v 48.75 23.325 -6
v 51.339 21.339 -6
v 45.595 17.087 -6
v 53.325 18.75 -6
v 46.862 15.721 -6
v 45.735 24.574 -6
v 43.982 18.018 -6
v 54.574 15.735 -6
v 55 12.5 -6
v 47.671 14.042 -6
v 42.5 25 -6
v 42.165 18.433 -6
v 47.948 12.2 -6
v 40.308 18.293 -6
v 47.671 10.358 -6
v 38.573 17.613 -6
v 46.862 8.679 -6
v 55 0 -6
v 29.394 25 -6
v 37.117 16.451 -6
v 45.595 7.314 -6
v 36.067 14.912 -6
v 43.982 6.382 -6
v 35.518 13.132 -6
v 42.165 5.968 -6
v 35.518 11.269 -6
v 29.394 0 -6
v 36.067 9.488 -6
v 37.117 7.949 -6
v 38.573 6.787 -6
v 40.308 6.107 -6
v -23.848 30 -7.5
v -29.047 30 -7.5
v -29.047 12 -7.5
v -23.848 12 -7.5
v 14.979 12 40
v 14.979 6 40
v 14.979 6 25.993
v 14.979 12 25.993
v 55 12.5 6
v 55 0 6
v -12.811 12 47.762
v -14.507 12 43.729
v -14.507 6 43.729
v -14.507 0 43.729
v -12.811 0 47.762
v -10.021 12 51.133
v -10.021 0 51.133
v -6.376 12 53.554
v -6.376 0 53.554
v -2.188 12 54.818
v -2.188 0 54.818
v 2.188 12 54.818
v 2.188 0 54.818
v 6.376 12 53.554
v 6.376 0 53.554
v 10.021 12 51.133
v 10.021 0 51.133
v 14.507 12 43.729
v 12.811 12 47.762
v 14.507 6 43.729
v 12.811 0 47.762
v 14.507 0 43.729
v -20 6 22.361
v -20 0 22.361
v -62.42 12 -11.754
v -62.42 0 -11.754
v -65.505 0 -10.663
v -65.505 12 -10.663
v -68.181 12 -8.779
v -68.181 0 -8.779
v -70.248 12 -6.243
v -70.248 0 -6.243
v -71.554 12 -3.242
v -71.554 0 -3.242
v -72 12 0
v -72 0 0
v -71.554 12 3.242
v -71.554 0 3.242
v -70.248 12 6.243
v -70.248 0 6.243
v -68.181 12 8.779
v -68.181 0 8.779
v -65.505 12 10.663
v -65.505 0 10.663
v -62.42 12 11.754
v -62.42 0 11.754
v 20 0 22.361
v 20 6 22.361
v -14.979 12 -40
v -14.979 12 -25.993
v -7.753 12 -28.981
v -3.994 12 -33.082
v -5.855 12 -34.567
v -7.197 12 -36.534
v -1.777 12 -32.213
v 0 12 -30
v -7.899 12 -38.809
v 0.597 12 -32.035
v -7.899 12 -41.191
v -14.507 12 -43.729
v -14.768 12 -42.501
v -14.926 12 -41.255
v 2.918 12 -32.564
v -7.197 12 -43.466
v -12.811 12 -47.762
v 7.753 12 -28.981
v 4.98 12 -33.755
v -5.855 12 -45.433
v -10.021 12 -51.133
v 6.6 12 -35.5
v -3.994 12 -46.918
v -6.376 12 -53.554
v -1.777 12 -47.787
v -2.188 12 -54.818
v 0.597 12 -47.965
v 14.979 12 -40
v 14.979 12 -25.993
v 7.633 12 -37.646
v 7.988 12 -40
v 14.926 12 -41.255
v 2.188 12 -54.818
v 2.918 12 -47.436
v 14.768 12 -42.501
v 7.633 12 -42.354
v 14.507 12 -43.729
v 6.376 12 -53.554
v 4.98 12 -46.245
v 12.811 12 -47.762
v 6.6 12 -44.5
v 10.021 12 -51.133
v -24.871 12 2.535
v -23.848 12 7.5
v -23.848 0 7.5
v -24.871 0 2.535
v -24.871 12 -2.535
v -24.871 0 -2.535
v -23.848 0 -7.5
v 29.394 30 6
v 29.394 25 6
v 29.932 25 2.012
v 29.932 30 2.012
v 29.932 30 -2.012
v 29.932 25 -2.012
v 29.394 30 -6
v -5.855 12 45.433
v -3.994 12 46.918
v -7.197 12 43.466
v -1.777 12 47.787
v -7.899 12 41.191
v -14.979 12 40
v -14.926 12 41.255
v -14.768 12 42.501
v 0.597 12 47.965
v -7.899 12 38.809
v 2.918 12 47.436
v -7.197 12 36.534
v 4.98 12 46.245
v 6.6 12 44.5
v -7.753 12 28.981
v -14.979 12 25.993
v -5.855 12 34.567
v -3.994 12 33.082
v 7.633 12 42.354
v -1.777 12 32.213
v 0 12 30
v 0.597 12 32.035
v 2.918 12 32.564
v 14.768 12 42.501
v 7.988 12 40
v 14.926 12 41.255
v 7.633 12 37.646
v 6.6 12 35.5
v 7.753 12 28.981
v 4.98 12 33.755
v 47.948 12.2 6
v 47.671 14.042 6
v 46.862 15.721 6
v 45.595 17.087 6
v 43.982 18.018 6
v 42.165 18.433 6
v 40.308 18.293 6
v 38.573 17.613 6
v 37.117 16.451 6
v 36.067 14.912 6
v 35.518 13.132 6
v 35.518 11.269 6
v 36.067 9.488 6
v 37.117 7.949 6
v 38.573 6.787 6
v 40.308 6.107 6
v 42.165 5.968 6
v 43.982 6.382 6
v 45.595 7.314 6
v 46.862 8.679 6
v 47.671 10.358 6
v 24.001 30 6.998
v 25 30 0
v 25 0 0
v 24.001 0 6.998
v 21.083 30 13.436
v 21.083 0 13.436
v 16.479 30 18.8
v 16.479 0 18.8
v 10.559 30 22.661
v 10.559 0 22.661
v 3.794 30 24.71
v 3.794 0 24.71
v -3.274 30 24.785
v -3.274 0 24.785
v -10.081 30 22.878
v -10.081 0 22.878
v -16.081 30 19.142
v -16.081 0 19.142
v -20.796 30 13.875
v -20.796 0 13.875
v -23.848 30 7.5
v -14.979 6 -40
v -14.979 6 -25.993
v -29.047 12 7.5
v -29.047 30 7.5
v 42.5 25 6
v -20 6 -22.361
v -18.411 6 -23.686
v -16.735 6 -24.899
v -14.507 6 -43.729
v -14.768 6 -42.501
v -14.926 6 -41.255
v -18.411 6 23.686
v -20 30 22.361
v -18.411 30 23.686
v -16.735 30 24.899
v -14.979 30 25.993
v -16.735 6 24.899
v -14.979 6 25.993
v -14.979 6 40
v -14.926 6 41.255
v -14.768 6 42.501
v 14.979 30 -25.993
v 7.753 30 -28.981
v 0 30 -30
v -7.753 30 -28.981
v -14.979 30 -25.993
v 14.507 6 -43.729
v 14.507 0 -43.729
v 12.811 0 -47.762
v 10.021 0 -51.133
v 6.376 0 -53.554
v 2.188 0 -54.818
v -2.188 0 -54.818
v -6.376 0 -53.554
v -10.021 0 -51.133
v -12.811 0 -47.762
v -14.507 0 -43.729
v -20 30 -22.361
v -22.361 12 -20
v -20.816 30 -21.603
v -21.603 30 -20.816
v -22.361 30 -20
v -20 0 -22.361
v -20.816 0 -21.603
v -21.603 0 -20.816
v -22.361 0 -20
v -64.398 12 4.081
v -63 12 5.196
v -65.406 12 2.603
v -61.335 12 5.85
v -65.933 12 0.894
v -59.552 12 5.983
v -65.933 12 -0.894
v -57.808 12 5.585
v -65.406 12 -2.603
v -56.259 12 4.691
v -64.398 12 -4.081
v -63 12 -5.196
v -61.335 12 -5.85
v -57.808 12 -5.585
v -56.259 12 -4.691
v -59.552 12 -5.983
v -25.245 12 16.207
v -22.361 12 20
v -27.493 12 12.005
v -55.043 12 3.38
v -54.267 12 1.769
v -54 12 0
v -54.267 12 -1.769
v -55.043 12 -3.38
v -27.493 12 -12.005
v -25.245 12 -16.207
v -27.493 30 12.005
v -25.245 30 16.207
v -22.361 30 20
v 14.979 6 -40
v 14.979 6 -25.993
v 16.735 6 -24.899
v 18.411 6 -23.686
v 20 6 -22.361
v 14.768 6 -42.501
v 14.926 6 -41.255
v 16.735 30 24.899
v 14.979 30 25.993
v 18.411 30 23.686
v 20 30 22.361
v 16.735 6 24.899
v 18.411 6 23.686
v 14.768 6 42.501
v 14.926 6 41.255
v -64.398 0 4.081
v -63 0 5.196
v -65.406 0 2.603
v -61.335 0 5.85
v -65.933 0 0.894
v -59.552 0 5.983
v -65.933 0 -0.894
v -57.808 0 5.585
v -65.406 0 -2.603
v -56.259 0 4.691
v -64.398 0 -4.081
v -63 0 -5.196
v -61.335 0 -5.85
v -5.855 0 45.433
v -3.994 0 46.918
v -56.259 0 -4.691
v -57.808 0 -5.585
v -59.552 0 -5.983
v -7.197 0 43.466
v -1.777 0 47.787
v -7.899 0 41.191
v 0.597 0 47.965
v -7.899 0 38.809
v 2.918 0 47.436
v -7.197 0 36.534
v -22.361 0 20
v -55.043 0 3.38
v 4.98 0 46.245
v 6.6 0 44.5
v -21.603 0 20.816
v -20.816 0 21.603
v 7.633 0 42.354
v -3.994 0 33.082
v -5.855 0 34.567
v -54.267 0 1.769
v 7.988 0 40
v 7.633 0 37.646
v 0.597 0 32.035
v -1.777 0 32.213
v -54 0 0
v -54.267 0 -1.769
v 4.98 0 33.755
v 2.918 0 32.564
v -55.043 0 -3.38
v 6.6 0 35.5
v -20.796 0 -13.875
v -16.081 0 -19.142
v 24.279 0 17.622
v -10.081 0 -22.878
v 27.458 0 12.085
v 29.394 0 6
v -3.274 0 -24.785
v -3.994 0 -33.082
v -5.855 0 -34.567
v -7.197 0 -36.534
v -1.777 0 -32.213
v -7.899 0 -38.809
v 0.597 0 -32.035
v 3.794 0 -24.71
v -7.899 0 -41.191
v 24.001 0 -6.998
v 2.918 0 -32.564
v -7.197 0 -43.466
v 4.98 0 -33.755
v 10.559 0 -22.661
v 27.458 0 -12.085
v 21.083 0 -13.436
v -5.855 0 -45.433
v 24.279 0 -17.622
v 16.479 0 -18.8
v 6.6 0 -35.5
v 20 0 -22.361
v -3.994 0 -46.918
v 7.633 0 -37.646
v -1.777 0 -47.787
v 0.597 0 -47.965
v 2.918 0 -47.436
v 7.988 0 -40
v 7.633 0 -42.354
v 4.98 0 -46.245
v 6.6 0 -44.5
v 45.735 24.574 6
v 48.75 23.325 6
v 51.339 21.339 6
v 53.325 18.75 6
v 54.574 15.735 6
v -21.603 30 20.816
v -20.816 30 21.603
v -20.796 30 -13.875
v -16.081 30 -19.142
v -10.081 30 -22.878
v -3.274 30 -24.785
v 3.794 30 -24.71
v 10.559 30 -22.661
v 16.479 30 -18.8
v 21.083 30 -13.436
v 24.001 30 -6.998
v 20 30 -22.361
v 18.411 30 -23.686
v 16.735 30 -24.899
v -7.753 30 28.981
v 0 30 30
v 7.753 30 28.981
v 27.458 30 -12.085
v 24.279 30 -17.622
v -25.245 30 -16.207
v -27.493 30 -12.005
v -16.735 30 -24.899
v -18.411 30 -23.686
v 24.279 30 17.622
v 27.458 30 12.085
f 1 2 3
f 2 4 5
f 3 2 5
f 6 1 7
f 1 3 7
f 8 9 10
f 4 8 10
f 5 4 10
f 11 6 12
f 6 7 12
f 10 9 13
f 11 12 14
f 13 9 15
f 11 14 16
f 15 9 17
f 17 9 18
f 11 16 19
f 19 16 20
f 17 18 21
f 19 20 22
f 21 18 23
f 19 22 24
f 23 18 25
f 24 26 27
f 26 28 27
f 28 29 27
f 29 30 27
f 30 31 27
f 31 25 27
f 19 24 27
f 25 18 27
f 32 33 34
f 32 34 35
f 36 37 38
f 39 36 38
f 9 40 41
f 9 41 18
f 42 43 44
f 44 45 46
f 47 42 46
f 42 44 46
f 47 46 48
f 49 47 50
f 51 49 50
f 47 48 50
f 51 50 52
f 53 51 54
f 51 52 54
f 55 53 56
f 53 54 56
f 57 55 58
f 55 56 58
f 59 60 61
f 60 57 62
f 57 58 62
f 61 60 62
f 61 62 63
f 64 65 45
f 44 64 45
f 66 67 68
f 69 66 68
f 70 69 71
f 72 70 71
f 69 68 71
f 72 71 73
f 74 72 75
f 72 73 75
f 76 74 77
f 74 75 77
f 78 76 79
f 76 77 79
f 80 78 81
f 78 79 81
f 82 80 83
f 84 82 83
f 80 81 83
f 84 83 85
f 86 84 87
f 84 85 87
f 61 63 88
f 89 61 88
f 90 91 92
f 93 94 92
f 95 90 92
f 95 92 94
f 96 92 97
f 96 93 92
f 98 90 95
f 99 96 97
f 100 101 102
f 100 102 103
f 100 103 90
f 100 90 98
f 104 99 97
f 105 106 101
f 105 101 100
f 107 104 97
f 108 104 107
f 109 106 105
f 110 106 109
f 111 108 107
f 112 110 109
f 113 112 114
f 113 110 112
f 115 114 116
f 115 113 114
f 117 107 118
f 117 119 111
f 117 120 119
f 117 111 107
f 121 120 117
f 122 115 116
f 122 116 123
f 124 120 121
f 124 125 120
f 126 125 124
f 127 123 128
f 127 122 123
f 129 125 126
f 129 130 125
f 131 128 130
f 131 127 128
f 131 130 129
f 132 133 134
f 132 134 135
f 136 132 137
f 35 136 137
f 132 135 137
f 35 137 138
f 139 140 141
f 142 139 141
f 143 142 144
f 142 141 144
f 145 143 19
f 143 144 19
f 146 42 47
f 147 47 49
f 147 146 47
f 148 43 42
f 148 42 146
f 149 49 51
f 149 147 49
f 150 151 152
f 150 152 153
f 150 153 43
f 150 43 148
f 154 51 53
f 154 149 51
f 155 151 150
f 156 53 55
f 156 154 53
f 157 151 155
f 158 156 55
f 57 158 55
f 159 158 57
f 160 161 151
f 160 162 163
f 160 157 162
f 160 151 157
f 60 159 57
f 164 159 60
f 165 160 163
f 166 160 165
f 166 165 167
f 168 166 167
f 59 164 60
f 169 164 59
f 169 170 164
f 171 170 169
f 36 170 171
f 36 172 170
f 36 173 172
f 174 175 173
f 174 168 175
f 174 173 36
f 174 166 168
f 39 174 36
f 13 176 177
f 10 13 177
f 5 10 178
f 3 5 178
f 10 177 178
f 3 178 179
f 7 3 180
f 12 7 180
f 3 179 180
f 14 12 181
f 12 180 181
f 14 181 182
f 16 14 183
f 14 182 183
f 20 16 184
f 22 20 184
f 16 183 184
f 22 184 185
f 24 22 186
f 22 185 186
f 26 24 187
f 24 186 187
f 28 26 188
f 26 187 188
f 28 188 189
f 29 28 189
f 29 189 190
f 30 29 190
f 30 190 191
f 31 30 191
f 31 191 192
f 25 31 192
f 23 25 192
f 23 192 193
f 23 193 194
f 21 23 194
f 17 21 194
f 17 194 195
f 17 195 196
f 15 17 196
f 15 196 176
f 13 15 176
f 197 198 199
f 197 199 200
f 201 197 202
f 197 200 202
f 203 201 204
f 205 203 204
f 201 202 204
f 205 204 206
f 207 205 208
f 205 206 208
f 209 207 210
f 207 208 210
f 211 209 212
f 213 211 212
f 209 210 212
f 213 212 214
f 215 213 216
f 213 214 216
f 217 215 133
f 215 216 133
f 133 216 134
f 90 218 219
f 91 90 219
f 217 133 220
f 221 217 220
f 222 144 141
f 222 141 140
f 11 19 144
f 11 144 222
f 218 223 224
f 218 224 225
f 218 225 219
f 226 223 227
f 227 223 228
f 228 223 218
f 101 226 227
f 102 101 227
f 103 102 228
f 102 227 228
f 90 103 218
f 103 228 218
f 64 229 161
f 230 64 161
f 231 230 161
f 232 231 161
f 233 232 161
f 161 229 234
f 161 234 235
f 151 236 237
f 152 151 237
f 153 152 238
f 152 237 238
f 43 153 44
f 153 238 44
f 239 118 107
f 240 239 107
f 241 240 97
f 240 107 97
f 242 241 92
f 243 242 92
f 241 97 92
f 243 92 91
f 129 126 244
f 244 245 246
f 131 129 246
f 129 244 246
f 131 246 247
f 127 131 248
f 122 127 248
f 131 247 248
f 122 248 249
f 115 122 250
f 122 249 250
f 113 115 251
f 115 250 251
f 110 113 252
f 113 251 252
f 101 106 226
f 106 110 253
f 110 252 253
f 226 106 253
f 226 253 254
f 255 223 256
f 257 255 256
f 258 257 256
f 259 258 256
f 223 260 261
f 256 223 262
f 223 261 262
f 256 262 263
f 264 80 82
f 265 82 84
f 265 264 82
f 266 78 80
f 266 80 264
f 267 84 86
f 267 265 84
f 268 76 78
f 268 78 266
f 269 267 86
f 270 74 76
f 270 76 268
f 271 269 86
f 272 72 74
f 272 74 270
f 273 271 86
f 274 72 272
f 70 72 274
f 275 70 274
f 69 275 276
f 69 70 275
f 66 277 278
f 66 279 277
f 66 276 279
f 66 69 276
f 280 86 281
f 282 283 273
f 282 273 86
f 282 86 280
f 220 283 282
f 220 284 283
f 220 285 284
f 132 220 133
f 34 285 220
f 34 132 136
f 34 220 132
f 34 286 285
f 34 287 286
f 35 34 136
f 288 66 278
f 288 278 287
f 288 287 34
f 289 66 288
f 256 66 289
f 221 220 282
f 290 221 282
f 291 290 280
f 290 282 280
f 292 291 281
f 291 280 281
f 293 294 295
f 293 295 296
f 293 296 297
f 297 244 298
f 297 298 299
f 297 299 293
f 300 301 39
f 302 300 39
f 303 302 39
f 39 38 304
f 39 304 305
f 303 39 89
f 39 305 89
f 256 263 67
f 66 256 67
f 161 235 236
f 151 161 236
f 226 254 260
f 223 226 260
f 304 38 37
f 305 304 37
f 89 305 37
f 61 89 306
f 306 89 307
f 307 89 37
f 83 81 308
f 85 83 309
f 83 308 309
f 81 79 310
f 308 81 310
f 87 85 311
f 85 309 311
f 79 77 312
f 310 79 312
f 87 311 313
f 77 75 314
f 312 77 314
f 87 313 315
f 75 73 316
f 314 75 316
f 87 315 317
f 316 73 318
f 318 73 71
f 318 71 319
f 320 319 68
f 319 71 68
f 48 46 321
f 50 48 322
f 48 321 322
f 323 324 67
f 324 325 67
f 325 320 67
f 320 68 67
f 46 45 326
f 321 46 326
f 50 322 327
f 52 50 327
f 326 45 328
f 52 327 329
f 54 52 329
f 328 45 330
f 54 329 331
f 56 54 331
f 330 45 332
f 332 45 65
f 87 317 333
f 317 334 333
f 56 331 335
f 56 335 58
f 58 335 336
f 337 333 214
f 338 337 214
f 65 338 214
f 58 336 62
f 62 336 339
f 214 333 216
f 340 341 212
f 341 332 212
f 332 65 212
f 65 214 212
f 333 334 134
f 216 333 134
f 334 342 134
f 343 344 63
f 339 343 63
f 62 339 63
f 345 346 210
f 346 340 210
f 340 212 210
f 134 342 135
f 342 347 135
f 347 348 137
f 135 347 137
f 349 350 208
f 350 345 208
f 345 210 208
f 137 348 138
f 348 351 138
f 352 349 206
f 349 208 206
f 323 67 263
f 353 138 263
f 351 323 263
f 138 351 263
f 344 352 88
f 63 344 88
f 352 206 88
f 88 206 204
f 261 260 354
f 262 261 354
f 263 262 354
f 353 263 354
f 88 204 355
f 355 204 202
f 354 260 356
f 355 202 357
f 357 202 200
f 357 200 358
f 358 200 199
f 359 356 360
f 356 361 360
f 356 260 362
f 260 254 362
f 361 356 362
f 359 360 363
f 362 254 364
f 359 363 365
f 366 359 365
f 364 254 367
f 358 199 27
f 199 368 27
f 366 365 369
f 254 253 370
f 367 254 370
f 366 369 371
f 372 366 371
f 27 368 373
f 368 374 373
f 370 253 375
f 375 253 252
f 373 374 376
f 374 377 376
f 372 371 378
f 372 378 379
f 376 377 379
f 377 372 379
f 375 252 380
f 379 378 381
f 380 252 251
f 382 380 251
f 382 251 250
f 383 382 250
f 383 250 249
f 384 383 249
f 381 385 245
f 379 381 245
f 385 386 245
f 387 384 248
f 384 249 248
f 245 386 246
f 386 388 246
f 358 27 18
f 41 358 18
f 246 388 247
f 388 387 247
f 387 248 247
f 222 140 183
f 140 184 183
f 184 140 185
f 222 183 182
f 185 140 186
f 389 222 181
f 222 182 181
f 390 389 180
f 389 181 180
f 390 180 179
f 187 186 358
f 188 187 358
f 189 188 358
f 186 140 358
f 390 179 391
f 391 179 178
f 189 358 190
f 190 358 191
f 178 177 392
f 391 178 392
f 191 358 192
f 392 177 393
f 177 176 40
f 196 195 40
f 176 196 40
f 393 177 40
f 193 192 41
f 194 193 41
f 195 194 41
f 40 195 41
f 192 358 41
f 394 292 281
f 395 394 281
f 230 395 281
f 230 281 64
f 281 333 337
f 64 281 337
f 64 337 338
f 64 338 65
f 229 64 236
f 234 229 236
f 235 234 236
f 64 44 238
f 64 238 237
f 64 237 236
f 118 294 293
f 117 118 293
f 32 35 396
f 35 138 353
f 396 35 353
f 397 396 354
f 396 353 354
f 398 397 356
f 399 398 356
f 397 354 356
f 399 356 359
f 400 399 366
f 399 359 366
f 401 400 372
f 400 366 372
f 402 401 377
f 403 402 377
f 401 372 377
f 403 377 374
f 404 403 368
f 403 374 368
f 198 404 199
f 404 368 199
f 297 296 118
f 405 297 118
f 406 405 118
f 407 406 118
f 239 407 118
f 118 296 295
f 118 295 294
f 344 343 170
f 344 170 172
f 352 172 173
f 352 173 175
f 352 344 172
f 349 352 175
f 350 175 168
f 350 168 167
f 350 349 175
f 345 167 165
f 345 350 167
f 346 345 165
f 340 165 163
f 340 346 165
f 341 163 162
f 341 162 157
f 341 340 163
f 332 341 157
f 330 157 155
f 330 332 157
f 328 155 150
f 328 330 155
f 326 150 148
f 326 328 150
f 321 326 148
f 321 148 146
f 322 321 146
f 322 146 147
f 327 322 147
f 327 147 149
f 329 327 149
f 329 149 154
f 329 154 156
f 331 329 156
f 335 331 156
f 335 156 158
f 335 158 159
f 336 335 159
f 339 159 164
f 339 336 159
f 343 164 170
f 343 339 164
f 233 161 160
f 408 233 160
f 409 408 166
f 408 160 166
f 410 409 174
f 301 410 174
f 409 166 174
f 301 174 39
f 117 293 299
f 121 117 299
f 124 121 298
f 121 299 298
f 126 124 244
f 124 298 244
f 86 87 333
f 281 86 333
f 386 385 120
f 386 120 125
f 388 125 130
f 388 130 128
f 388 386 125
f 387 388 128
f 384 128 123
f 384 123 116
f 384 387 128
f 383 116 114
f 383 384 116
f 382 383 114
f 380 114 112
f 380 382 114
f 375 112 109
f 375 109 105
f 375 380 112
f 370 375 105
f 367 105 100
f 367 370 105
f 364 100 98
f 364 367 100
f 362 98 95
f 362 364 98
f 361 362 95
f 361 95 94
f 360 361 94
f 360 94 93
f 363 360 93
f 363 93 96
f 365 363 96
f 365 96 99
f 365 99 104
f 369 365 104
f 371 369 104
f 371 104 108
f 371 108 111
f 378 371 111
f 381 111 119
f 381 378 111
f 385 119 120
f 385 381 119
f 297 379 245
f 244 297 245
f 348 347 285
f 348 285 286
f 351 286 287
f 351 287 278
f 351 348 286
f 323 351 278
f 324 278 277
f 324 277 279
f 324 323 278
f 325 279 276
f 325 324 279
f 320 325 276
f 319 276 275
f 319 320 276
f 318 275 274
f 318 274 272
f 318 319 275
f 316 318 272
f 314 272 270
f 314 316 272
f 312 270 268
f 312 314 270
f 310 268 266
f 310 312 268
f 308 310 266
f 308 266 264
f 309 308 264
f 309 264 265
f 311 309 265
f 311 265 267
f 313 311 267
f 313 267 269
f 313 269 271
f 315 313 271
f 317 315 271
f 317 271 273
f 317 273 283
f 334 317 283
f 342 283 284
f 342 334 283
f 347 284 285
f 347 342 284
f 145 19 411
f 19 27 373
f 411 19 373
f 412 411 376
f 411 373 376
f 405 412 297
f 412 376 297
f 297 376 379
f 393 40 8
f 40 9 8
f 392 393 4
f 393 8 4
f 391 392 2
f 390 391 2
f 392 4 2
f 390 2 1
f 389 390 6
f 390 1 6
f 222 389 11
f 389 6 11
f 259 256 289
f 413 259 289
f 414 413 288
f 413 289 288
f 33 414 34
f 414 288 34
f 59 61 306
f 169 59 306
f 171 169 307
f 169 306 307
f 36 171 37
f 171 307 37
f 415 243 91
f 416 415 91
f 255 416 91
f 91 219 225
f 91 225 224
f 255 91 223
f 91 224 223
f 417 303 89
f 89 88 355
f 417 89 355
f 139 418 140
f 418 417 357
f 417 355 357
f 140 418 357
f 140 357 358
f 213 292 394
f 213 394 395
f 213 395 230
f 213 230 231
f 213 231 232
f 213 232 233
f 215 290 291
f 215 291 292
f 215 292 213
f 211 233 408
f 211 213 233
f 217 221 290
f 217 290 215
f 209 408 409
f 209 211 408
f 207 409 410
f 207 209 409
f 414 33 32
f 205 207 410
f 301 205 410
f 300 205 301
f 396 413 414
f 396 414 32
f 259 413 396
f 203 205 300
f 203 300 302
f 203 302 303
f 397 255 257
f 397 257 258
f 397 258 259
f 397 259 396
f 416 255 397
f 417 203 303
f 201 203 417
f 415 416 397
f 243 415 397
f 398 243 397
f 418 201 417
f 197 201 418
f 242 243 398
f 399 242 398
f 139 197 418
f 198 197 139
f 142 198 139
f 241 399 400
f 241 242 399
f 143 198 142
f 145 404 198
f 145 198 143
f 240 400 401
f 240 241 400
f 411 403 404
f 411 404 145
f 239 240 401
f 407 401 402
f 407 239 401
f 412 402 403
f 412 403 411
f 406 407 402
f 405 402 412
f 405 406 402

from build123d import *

# Parameters (mm, degrees)
Y_KSEKLIK_EKSTR_ZYON2_DEPTH = 30
IZIM1_7_R                   = 6
IZIM1_7_R_2                 = 7.987749768
Y_KSEKLIK_EKSTR_ZYON3_DEPTH = 12
Y_KSEKLIK_EKSTR_ZYON6_DEPTH = 6
Y_KSEKLIK_EKSTR_ZYON7_DEPTH = 25
RADYUS1_R                   = 12.5
IZIM2_R                     = 6.25
KES_EKSTR_ZYON1_DEPTH       = 100.007092258


with BuildPart() as part:
    # Çizim1 → Yükseklik-Ekstrüzyon2 (new body)
    with BuildSketch(Plane(origin=(0, 0, 0), x_dir=(1, 0, 0), z_dir=(0, 1, 0))):
        with BuildLine():
            ThreePointArc((-20, 22.360679775), (-21.213203436, 21.213203436), (-22.360679775, 20))
            ThreePointArc((-22.360679775, 20), (-26.452968197, 14.150635095), (-29.047375097, 7.5))
            Line((-29.047375097, 7.5), (-23.848480035, 7.5))
            ThreePointArc((-23.848480035, 7.5), (3.793942482, 24.710443145), (25, 0))
            ThreePointArc((25, 0), (3.793942482, -24.710443145), (-23.848480035, -7.5))
            Line((-23.848480035, -7.5), (-29.047375097, -7.5))
            ThreePointArc((-29.047375097, -7.5), (-26.452968197, -14.150635095), (-22.360679775, -20))
            ThreePointArc((-22.360679775, -20), (-21.213203436, -21.213203436), (-20, -22.360679775))
            ThreePointArc((-20, -22.360679775), (-17.58340753, -24.306866923), (-14.978720201, -25.993036397))
            ThreePointArc((-14.978720201, -25.993036397), (0, -30), (14.978720201, -25.993036397))
            ThreePointArc((14.978720201, -25.993036397), (17.58340753, -24.306866923), (20, -22.360679775))
            ThreePointArc((20, -22.360679775), (26.016470356, -14.937980794), (29.393876913, -6))
            ThreePointArc((29.393876913, -6), (30, 0), (29.393876913, 6))
            ThreePointArc((29.393876913, 6), (26.016470356, 14.937980794), (20, 22.360679775))
            ThreePointArc((20, 22.360679775), (17.58340753, 24.306866923), (14.978720201, 25.993036397))
            ThreePointArc((14.978720201, 25.993036397), (0, 30), (-14.978720201, 25.993036397))
            ThreePointArc((-14.978720201, 25.993036397), (-17.58340753, 24.306866923), (-20, 22.360679775))
        make_face()
    extrude(amount=Y_KSEKLIK_EKSTR_ZYON2_DEPTH)

    # Çizim1<7> → Yükseklik-Ekstrüzyon3 (add)
    # profile 1 of 3: a face of its own
    with BuildSketch(Plane(origin=(0, 0, 0), x_dir=(1, 0, 0), z_dir=(0, 1, 0))):
        with BuildLine():
            Line((-22.360679775, 20), (-62.419565489, 11.753540013))
            ThreePointArc((-62.419565489, 11.753540013), (-72, 0), (-62.419565489, -11.753540013))
            Line((-62.419565489, -11.753540013), (-22.360679775, -20))
            ThreePointArc((-22.360679775, -20), (-26.452968197, -14.150635095), (-29.047375097, -7.5))
            Line((-29.047375097, -7.5), (-23.848480035, -7.5))
            ThreePointArc((-23.848480035, -7.5), (-25, 0), (-23.848480035, 7.5))
            Line((-23.848480035, 7.5), (-29.047375097, 7.5))
            ThreePointArc((-29.047375097, 7.5), (-26.452968197, 14.150635095), (-22.360679775, 20))
        make_face()
        with Locations((-60, 0)):
            Circle(IZIM1_7_R, mode=Mode.SUBTRACT)
    # profile 2 of 3: a face of its own
    with BuildSketch(Plane(origin=(0, 0, 0), x_dir=(1, 0, 0), z_dir=(0, 1, 0))):
        with BuildLine():
            ThreePointArc((14.978720201, 40), (0, 54.978720201), (-14.978720201, 40))
            Line((-14.978720201, 40), (-14.978720201, 25.993036397))
            ThreePointArc((-14.978720201, 25.993036397), (0, 30), (14.978720201, 25.993036397))
            Line((14.978720201, 25.993036397), (14.978720201, 40))
        make_face()
        with Locations((0, 40)):
            Circle(IZIM1_7_R_2, mode=Mode.SUBTRACT)
    # profile 3 of 3: a face of its own
    with BuildSketch(Plane(origin=(0, 0, 0), x_dir=(1, 0, 0), z_dir=(0, 1, 0))):
        with BuildLine():
            ThreePointArc((-14.978720201, -40), (0, -54.978720201), (14.978720201, -40))
            Line((14.978720201, -40), (14.978720201, -25.993036397))
            ThreePointArc((14.978720201, -25.993036397), (0, -30), (-14.978720201, -25.993036397))
            Line((-14.978720201, -25.993036397), (-14.978720201, -40))
        make_face()
        with Locations((0, -40)):
            Circle(IZIM1_7_R_2, mode=Mode.SUBTRACT)
    extrude(amount=Y_KSEKLIK_EKSTR_ZYON3_DEPTH)

    # Çizim1<12> → Yükseklik-Ekstrüzyon6 (add)
    with BuildSketch(Plane(origin=(0, 0, 0), x_dir=(1, 0, 0), z_dir=(0, 1, 0))):
        with BuildLine():
            Line((-14.507084908, 43.729148203), (-20, 22.360679775))
            ThreePointArc((-20, 22.360679775), (-17.58340753, 24.306866923), (-14.978720201, 25.993036397))
            Line((-14.978720201, 25.993036397), (-14.978720201, 40))
            ThreePointArc((-14.978720201, 40), (-14.860343614, 41.879427184), (-14.507084908, 43.729148203))
        make_face()
        with BuildLine():
            ThreePointArc((-14.978720201, -25.993036397), (-17.58340753, -24.306866923), (-20, -22.360679775))
            Line((-20, -22.360679775), (-14.507084908, -43.729148203))
            ThreePointArc((-14.507084908, -43.729148203), (-14.860343614, -41.879427184), (-14.978720201, -40))
            Line((-14.978720201, -40), (-14.978720201, -25.993036397))
        make_face()
        with BuildLine():
            Line((20, 22.360679775), (14.507084908, 43.729148203))
            ThreePointArc((14.507084908, 43.729148203), (14.860343614, 41.879427184), (14.978720201, 40))
            Line((14.978720201, 40), (14.978720201, 25.993036397))
            ThreePointArc((14.978720201, 25.993036397), (17.58340753, 24.306866923), (20, 22.360679775))
        make_face()
        with BuildLine():
            ThreePointArc((14.978720201, -40), (14.860343614, -41.879427184), (14.507084908, -43.729148203))
            Line((14.507084908, -43.729148203), (20, -22.360679775))
            ThreePointArc((20, -22.360679775), (17.58340753, -24.306866923), (14.978720201, -25.993036397))
            Line((14.978720201, -25.993036397), (14.978720201, -40))
        make_face()
    extrude(amount=Y_KSEKLIK_EKSTR_ZYON6_DEPTH)

    # Çizim1<13> → Yükseklik-Ekstrüzyon7 (add)
    with BuildSketch(Plane(origin=(0, 0, 0), x_dir=(1, 0, 0), z_dir=(0, 1, 0))):
        with BuildLine():
            Line((55, 6), (29.393876913, 6))
            ThreePointArc((29.393876913, 6), (30, 0), (29.393876913, -6))
            Line((29.393876913, -6), (55, -6))
            Line((55, -6), (55, 6))
        make_face()
    extrude(amount=Y_KSEKLIK_EKSTR_ZYON7_DEPTH)

    # Radyus1
    radyus1_edges = [part.edges().sort_by_distance(p)[0] for p in [
        (55, 25, 0),
    ]]
    fillet(radyus1_edges, radius=RADYUS1_R)

    # Çizim2 → Kes-Ekstrüzyon1 (cut, through all)
    with BuildSketch(Plane.XY.offset(6)):
        with Locations((41.698353051, 12.200101709)):
            Circle(IZIM2_R)
    extrude(amount=-KES_EKSTR_ZYON1_DEPTH, mode=Mode.SUBTRACT)


solid = part.part
